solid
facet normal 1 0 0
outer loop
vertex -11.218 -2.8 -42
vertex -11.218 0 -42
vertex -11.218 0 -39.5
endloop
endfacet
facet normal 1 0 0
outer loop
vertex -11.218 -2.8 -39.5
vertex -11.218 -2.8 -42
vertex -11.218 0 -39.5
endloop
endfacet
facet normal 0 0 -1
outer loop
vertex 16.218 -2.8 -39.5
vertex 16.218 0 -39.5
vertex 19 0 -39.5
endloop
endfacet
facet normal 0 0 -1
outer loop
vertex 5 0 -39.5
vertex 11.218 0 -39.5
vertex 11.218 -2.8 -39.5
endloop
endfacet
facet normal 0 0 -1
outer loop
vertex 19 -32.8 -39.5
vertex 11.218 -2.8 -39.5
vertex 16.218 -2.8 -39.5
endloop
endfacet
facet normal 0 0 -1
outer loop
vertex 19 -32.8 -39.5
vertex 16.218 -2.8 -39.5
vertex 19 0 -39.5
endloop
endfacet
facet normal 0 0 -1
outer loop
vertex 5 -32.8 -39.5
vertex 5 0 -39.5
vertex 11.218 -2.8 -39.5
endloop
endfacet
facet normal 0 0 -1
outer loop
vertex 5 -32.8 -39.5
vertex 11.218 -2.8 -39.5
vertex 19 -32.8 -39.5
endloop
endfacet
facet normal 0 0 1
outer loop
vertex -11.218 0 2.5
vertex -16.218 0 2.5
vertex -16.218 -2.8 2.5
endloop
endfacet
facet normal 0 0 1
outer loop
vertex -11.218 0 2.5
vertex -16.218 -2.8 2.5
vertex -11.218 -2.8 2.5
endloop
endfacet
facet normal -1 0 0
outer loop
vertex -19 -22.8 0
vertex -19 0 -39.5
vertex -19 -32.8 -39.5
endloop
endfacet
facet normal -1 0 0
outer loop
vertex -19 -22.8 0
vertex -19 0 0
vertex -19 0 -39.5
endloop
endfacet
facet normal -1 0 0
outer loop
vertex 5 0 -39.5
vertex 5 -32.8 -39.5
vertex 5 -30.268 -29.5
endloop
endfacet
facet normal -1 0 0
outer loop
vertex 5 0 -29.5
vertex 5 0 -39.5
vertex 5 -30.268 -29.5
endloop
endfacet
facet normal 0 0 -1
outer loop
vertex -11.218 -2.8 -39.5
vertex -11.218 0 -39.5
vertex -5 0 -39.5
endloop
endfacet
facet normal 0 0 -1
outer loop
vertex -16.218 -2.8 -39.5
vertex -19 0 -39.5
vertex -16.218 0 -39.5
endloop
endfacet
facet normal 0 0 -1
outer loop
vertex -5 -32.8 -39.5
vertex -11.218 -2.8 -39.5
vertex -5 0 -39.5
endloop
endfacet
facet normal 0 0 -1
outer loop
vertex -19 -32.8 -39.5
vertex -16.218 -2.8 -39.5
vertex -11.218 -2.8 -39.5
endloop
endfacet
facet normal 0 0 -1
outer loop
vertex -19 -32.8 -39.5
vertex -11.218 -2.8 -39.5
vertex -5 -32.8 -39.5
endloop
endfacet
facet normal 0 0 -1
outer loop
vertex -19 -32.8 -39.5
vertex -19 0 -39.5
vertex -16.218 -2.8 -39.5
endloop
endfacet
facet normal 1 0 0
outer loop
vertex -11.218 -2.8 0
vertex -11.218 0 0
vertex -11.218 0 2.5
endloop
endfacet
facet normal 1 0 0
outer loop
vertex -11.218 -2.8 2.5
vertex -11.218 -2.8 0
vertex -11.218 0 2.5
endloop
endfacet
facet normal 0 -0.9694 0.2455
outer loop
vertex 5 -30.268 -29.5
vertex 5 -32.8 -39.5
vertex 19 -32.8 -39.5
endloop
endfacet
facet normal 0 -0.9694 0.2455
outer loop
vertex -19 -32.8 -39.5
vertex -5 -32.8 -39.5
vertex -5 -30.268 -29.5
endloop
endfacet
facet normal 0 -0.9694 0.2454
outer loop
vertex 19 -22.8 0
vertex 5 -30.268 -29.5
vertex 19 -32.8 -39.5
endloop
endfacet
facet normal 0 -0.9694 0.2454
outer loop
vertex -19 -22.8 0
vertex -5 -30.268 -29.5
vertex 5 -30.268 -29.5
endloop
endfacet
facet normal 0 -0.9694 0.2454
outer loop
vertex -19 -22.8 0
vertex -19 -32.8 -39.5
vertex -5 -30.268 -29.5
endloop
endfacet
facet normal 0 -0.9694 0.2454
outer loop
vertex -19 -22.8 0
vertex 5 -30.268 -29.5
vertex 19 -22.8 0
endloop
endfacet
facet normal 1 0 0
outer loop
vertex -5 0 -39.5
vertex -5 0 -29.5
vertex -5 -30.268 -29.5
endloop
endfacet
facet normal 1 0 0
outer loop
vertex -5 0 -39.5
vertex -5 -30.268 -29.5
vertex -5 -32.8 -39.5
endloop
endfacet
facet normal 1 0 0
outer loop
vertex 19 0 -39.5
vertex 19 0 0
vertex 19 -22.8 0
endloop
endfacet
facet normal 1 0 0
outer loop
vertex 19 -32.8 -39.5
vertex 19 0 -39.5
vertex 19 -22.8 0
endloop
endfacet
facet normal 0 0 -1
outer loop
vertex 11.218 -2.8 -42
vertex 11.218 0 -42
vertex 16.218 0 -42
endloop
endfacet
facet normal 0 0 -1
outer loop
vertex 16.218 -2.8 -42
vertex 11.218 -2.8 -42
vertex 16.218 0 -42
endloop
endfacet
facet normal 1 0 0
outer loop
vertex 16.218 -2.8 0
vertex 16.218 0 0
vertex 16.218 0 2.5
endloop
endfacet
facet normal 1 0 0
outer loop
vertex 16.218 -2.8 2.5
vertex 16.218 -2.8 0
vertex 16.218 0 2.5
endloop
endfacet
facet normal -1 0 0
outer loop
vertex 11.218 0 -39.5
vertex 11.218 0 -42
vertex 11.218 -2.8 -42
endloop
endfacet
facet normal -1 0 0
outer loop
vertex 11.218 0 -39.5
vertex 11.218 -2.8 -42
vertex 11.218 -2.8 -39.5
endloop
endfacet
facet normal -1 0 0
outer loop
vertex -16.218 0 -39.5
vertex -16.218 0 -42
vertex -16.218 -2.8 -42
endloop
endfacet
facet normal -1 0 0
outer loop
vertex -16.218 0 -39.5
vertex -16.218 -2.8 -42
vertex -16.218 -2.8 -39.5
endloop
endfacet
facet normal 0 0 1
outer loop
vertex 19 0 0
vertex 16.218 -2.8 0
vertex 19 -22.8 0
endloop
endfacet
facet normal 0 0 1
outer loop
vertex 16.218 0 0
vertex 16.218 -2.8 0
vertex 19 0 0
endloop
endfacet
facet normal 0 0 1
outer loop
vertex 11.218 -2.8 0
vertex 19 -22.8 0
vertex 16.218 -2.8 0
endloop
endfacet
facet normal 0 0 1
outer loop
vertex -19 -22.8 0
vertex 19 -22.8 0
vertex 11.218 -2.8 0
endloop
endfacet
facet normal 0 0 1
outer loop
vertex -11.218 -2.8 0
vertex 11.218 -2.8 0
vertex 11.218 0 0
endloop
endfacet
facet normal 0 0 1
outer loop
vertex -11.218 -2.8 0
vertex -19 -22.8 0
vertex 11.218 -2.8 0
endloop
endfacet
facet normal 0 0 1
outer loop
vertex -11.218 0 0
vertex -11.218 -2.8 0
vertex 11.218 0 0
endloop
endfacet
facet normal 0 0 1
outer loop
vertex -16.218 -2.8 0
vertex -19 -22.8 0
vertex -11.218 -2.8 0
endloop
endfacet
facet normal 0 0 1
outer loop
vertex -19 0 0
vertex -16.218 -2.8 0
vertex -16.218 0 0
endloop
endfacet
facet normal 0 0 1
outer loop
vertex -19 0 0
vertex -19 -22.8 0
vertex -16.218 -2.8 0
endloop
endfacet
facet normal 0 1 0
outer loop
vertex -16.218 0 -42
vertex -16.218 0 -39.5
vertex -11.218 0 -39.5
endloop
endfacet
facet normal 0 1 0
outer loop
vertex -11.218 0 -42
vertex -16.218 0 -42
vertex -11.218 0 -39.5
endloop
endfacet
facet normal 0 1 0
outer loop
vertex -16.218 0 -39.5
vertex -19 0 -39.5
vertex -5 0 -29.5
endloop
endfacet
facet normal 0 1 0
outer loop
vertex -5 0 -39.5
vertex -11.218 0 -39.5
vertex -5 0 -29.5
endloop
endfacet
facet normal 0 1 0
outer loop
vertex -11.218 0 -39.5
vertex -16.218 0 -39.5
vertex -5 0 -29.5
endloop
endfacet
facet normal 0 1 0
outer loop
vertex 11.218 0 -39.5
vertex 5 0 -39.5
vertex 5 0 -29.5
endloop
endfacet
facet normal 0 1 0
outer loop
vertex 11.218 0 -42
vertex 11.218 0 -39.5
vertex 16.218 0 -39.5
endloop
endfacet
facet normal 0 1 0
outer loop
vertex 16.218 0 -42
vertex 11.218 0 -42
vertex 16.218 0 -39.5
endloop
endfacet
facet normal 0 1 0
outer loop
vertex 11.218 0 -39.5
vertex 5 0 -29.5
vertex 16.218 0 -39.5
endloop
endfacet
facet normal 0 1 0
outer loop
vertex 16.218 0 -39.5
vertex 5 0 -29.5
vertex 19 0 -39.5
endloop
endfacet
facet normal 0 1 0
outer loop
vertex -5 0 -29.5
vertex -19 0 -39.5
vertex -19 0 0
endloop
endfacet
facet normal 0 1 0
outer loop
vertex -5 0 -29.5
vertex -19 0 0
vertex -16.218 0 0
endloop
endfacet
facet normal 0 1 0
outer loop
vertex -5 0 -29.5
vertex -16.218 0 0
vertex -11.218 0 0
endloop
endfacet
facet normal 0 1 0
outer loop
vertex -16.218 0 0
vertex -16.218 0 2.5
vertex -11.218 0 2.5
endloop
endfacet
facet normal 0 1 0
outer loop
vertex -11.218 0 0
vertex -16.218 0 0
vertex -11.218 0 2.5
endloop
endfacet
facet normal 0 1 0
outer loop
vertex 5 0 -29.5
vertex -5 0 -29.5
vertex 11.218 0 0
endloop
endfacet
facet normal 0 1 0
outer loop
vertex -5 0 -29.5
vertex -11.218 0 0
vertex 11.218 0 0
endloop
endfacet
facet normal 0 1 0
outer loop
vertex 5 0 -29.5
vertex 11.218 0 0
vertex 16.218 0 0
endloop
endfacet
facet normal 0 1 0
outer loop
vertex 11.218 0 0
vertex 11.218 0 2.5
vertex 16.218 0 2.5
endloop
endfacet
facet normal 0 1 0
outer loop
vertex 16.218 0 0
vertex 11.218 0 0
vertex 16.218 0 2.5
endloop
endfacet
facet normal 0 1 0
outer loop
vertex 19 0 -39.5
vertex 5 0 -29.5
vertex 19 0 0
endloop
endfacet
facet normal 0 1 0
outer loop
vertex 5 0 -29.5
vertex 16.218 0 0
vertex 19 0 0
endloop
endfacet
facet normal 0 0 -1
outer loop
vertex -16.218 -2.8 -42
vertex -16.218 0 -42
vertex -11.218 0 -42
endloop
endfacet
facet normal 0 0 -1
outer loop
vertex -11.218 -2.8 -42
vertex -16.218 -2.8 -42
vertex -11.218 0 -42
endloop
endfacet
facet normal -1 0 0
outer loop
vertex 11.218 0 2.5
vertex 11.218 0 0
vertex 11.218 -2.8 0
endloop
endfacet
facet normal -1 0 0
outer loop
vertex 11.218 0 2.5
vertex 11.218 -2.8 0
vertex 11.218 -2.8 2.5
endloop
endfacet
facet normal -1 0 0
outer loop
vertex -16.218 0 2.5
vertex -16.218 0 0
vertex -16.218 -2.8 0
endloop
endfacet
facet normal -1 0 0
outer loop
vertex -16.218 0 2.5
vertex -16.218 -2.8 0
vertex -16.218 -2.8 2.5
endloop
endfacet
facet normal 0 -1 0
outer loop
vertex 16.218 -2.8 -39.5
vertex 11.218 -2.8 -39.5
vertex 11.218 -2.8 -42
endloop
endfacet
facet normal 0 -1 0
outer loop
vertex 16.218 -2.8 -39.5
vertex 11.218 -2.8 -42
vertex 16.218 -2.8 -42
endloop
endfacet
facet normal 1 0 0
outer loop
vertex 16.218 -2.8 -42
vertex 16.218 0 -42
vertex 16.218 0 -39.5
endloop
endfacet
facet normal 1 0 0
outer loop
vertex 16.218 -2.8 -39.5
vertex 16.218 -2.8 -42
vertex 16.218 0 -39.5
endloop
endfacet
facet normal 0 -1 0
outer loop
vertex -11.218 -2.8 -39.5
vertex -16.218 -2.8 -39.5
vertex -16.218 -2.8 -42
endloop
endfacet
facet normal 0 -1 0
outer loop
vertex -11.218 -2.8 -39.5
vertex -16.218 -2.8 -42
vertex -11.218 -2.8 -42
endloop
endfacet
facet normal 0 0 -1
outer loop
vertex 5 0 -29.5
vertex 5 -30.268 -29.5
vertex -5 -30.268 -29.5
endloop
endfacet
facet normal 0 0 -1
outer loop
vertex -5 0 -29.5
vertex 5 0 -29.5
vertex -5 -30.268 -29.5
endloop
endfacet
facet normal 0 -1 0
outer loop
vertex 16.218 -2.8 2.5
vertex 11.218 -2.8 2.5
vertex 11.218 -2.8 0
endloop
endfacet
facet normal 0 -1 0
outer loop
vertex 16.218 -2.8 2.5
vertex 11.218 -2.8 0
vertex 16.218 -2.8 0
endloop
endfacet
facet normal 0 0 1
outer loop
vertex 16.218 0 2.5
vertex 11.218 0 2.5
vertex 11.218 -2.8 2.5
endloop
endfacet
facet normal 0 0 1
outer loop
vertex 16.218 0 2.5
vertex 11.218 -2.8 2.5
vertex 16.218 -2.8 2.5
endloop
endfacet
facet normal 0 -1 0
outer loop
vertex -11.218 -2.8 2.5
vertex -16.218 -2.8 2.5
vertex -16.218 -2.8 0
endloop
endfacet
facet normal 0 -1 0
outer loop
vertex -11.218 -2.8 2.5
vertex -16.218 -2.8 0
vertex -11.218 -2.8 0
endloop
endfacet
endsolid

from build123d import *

# Parameters (mm, degrees)
F0_W     = 5
F0_H     = 2.5
F1_DEPTH = 2.8
F3_DEPTH = 38
F5_DEPTH = 40


with BuildPart() as f1:
    # F0 (on Front) → F1 (new body)
    with BuildSketch(Plane.XZ):
        with Locations((-13.717596, 1.25)):
            Rectangle(F0_W, F0_H)
        with Locations((13.717596, 1.25)):
            Rectangle(F0_W, F0_H)
        with Locations((-13.717596, -40.75)):
            Rectangle(F0_W, F0_H)
        with Locations((13.717596, -40.75)):
            Rectangle(F0_W, F0_H)
        Polygon((11.217596, 0), (0, 0), (-11.217596, 0), (-16.217596, 0), (-19, 0), (-19, -39.5), (-16.217596, -39.5), (-11.217596, -39.5), (0, -39.5), (11.217596, -39.5), (16.217596, -39.5), (19, -39.5), (19, 0), (16.217596, 0), align=None)
    extrude(amount=F1_DEPTH)

    # F2 (on face) → F3 (join)
    with BuildSketch(Plane(origin=(-19, 0, 0), x_dir=(0, -1, 0), z_dir=(-1, 0, 0))):
        Polygon((2.8, 0), (2.8, -39.5), (32.8, -39.5), (22.8, 0), align=None)
    extrude(amount=-F3_DEPTH)

    # F4 (on face) → F5 (cut)
    with BuildSketch(Plane.XZ):
        Polygon((-5, -29.5), (-5, -39.5), (0, -39.5), (5, -39.5), (5, -29.5), align=None)
    extrude(amount=F5_DEPTH, mode=Mode.SUBTRACT)


solid = f1.part
